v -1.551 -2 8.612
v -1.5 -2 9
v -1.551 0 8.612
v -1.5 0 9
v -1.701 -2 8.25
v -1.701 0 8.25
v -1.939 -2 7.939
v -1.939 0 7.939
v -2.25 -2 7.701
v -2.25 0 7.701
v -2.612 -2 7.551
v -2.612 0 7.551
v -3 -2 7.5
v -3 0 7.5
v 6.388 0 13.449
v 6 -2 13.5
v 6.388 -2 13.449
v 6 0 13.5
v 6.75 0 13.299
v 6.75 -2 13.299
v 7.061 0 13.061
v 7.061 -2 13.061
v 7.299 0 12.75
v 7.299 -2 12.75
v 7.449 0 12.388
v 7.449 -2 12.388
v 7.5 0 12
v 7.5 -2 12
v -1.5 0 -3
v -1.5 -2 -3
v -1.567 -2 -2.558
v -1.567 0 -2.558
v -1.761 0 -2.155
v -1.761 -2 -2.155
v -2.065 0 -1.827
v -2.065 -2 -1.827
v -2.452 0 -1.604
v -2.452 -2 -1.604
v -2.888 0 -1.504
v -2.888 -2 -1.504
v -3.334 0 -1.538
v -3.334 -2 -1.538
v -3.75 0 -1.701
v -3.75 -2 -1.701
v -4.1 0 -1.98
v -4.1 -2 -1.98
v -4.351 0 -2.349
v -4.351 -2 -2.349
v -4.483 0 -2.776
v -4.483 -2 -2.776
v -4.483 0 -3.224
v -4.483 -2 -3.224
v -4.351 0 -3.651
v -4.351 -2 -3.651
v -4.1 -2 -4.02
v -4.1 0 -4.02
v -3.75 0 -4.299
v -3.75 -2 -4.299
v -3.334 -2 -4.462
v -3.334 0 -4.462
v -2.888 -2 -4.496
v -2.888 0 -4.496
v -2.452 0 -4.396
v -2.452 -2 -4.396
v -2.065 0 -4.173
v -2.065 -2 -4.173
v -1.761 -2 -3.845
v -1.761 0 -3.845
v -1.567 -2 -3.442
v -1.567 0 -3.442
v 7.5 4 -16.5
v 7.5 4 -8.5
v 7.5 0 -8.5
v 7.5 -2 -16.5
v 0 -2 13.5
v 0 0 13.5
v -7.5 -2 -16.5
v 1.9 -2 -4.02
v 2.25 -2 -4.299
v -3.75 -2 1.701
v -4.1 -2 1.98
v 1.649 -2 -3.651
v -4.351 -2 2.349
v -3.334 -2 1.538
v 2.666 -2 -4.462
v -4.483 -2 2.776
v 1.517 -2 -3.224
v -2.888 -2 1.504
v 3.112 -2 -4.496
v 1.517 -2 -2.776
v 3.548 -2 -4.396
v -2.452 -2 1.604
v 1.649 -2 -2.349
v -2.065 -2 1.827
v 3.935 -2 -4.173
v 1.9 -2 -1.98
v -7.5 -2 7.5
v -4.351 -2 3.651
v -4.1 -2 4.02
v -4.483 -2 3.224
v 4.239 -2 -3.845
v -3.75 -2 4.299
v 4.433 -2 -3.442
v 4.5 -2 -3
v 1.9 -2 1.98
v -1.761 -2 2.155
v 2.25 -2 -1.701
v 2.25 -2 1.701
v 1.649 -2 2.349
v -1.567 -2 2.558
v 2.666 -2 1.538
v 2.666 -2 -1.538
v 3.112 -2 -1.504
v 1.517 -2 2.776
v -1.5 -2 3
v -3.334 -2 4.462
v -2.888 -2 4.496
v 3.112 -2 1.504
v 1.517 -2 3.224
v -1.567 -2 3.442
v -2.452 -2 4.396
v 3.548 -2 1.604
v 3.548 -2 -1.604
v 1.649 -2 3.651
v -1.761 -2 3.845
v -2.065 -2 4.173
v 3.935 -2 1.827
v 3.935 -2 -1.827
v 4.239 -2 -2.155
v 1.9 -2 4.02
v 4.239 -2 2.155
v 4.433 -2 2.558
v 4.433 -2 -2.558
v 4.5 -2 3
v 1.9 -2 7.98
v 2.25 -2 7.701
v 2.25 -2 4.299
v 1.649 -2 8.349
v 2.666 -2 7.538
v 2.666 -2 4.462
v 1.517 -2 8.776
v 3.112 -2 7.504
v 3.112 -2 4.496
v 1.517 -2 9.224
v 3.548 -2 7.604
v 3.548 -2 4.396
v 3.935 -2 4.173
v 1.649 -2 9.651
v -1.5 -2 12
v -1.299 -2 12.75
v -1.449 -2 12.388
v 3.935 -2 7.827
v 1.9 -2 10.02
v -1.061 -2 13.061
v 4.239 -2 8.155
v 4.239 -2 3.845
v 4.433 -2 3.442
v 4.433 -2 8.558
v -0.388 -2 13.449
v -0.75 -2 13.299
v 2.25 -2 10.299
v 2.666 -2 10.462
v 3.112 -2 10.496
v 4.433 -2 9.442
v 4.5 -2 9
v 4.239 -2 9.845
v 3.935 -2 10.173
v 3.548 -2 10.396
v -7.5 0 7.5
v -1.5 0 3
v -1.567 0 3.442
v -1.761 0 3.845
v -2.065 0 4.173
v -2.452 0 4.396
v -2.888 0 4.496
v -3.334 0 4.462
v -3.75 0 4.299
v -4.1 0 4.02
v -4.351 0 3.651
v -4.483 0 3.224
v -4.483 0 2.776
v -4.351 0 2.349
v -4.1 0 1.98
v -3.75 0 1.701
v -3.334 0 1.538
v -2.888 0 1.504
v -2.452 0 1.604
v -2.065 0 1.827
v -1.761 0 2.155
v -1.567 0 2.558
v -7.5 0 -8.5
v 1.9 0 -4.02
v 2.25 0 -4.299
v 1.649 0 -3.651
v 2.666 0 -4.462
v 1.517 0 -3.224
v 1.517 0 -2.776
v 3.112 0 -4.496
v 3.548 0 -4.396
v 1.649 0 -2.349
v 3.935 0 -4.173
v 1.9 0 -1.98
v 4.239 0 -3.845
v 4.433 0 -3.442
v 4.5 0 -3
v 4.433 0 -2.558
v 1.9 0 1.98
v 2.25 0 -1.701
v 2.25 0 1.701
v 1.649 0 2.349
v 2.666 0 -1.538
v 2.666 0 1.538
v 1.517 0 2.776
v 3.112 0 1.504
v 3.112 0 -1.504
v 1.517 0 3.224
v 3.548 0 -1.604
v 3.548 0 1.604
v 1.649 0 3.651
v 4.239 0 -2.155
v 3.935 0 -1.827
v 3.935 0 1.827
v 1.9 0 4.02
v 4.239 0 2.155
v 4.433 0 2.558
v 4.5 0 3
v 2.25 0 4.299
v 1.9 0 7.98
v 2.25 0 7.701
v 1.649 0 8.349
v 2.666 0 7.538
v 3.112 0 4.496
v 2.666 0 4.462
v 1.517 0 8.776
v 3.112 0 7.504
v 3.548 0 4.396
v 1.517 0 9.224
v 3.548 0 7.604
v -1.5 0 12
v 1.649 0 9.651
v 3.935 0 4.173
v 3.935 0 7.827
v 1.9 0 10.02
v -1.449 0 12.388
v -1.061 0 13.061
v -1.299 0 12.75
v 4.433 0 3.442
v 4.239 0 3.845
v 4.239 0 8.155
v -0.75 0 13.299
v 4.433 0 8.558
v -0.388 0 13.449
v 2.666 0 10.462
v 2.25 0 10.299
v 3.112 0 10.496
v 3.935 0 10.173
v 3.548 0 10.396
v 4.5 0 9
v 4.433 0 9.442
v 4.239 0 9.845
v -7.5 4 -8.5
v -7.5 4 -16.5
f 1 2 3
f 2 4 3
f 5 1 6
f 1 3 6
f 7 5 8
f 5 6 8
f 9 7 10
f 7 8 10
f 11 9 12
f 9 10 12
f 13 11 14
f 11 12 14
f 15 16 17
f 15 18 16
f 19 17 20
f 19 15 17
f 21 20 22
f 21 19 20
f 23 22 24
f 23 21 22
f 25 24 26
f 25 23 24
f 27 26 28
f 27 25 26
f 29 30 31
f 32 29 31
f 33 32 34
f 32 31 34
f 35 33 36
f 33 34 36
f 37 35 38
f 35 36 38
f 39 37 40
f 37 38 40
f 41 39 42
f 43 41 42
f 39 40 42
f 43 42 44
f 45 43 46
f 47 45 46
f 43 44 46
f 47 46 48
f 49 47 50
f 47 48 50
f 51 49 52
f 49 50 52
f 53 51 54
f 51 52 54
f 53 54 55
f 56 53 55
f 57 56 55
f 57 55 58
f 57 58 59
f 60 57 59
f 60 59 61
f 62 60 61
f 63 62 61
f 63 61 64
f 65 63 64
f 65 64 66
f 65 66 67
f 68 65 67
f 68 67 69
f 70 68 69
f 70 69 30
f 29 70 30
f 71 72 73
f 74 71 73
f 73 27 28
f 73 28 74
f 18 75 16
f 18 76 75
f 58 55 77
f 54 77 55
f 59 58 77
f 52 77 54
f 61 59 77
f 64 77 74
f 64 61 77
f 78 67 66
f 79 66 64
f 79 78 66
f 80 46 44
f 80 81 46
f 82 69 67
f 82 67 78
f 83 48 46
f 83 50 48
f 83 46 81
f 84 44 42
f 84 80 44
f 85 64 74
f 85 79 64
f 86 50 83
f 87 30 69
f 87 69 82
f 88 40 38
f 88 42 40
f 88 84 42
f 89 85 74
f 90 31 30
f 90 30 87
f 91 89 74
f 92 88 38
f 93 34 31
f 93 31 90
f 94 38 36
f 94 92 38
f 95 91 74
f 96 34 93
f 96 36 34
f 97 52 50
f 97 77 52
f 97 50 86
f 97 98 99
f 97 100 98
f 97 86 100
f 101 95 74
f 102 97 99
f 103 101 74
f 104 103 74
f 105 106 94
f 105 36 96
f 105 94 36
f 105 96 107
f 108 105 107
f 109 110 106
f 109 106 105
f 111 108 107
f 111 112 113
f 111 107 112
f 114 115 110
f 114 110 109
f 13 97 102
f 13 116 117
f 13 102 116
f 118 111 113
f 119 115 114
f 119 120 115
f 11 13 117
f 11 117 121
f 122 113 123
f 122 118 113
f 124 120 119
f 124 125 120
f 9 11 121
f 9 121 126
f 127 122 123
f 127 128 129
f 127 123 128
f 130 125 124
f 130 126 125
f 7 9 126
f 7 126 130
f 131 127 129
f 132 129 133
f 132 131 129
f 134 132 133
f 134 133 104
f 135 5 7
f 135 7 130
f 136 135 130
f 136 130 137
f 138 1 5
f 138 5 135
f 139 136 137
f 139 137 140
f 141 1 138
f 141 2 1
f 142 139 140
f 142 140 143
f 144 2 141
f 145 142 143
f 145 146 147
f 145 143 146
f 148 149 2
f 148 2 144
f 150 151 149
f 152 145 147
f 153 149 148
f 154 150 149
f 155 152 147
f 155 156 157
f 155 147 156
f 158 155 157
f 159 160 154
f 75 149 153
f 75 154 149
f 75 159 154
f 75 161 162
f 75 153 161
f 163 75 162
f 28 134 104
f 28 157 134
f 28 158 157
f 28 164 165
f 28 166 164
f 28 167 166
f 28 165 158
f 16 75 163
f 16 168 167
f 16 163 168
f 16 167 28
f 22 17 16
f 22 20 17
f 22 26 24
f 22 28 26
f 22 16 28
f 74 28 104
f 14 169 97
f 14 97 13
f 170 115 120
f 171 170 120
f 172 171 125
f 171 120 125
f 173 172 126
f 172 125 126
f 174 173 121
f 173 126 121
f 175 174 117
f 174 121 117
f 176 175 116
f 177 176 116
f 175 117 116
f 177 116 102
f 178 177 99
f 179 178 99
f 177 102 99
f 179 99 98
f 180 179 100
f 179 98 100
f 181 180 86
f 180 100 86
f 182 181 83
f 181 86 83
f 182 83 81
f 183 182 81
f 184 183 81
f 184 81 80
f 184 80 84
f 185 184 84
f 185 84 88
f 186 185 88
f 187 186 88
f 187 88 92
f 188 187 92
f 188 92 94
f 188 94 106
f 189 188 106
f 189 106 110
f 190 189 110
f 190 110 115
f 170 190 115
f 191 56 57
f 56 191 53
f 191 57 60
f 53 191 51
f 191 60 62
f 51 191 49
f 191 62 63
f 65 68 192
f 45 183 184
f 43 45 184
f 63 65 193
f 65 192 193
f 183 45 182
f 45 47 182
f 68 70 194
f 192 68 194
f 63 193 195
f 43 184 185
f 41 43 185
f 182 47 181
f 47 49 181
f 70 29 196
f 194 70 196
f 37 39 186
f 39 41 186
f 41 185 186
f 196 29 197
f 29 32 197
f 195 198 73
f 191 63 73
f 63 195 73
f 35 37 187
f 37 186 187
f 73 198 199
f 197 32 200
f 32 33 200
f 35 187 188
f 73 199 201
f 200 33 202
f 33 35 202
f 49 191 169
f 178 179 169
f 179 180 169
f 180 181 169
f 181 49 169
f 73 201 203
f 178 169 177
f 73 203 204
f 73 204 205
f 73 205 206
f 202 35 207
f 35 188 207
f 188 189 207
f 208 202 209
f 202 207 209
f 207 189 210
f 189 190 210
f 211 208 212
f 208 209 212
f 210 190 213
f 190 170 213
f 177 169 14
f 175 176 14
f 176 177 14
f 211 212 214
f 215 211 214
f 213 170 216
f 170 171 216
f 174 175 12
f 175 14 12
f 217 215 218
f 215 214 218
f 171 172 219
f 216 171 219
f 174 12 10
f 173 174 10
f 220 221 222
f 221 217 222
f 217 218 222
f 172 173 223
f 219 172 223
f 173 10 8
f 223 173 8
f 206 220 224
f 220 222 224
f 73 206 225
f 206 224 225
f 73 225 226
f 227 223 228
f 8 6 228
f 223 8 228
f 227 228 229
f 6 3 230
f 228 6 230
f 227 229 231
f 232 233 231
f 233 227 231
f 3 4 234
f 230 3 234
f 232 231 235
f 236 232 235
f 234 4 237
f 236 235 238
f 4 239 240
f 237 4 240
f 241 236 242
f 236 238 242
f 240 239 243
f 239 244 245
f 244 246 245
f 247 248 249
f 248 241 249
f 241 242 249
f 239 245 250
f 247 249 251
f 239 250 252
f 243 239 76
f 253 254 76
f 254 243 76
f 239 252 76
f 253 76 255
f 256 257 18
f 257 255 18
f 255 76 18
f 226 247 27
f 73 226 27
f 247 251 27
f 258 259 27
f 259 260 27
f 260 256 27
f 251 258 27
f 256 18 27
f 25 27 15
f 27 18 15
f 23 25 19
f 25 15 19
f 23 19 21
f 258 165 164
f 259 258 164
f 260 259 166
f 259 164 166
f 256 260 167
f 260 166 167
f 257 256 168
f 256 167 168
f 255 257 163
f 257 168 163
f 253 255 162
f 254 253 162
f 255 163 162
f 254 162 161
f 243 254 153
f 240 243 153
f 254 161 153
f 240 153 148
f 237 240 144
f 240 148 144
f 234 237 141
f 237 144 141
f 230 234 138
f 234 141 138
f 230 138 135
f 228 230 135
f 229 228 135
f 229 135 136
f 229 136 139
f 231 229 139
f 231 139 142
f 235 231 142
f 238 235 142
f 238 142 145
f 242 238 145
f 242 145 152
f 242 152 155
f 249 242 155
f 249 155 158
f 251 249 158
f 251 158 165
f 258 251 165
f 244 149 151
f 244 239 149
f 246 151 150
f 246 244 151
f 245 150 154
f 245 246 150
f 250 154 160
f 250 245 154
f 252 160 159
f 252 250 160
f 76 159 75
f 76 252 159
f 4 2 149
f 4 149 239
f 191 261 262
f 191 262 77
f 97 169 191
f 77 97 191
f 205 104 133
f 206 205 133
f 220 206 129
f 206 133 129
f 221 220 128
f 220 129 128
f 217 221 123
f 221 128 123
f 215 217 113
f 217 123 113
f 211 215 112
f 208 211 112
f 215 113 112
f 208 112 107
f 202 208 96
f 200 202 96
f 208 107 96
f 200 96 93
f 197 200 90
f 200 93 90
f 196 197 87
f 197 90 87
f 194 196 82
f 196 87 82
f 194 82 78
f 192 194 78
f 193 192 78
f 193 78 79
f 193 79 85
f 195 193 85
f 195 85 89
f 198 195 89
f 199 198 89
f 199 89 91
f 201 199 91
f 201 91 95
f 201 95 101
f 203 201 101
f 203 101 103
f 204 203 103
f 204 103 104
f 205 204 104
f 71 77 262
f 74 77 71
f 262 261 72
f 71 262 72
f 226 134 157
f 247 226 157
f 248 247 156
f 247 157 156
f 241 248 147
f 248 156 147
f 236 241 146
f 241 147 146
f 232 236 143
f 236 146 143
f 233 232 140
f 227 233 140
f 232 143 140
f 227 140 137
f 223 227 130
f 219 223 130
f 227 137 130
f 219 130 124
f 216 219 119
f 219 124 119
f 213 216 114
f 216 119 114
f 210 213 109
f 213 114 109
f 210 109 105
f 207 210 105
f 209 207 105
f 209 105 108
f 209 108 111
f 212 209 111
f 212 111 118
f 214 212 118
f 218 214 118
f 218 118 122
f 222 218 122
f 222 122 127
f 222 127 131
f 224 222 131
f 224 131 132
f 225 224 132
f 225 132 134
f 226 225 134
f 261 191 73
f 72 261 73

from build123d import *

# Parameters (mm, degrees)
F0_W      = 15
F0_H      = 15
F1_DEPTH  = 2
F2_R      = 1.5
F3_DEPTH  = 25
F4_W      = 9
F4_H      = 2
F5_DEPTH  = 6
F6_R      = 1.5
F7_DEPTH  = 25
F8_R      = 1.5
F9_W      = 15
F9_H      = 2
F10_DEPTH = 1
F11_W     = 15
F11_H     = 6
F12_DEPTH = 8


with BuildPart() as f1:
    # F0 (on Front) → F1 (new body)
    with BuildSketch(Plane.XZ):
        Rectangle(F0_W, F0_H)
    extrude(amount=F1_DEPTH)

    # F2 (on face) → F3 (cut)
    with BuildSketch(Plane.XZ.offset(2)):
        with Locations((3, 3)):
            Circle(F2_R)
        with Locations((-3, 3)):
            Circle(F2_R)
        with Locations((-3, -3)):
            Circle(F2_R)
        with Locations((3, -3)):
            Circle(F2_R)
    extrude(amount=-F3_DEPTH, mode=Mode.SUBTRACT)

    # F4 (on face) → F5 (join)
    with BuildSketch(Plane.XY.offset(7.5)):
        with Locations((3, -1)):
            Rectangle(F4_W, F4_H)
    extrude(amount=F5_DEPTH)

    # F6 (on face) → F7 (cut)
    with BuildSketch(Plane.XZ.offset(2)):
        with Locations((3, 9)):
            Circle(F6_R)
    extrude(amount=-F7_DEPTH, mode=Mode.SUBTRACT)

    # F8
    f8_edges = [f1.edges().sort_by_distance(p)[0] for p in [
        (7.5, -1, 13.5),
        (-1.5, -1, 13.5),
        (-1.5, -1, 7.5),
    ]]
    fillet(f8_edges, radius=F8_R)

    # F9 (on face) → F10 (join)
    with BuildSketch(Plane(origin=(0, 0, -7.5), x_dir=(1, 0, 0), z_dir=(0, 0, -1))):
        with Locations((0, 1)):
            Rectangle(F9_W, F9_H)
    extrude(amount=F10_DEPTH)

    # F11 (on face) → F12 (join)
    with BuildSketch(Plane(origin=(0, 0, -8.5), x_dir=(1, 0, 0), z_dir=(0, 0, -1))):
        with Locations((0, -1)):
            Rectangle(F11_W, F11_H)
    extrude(amount=F12_DEPTH)


solid = f1.part
